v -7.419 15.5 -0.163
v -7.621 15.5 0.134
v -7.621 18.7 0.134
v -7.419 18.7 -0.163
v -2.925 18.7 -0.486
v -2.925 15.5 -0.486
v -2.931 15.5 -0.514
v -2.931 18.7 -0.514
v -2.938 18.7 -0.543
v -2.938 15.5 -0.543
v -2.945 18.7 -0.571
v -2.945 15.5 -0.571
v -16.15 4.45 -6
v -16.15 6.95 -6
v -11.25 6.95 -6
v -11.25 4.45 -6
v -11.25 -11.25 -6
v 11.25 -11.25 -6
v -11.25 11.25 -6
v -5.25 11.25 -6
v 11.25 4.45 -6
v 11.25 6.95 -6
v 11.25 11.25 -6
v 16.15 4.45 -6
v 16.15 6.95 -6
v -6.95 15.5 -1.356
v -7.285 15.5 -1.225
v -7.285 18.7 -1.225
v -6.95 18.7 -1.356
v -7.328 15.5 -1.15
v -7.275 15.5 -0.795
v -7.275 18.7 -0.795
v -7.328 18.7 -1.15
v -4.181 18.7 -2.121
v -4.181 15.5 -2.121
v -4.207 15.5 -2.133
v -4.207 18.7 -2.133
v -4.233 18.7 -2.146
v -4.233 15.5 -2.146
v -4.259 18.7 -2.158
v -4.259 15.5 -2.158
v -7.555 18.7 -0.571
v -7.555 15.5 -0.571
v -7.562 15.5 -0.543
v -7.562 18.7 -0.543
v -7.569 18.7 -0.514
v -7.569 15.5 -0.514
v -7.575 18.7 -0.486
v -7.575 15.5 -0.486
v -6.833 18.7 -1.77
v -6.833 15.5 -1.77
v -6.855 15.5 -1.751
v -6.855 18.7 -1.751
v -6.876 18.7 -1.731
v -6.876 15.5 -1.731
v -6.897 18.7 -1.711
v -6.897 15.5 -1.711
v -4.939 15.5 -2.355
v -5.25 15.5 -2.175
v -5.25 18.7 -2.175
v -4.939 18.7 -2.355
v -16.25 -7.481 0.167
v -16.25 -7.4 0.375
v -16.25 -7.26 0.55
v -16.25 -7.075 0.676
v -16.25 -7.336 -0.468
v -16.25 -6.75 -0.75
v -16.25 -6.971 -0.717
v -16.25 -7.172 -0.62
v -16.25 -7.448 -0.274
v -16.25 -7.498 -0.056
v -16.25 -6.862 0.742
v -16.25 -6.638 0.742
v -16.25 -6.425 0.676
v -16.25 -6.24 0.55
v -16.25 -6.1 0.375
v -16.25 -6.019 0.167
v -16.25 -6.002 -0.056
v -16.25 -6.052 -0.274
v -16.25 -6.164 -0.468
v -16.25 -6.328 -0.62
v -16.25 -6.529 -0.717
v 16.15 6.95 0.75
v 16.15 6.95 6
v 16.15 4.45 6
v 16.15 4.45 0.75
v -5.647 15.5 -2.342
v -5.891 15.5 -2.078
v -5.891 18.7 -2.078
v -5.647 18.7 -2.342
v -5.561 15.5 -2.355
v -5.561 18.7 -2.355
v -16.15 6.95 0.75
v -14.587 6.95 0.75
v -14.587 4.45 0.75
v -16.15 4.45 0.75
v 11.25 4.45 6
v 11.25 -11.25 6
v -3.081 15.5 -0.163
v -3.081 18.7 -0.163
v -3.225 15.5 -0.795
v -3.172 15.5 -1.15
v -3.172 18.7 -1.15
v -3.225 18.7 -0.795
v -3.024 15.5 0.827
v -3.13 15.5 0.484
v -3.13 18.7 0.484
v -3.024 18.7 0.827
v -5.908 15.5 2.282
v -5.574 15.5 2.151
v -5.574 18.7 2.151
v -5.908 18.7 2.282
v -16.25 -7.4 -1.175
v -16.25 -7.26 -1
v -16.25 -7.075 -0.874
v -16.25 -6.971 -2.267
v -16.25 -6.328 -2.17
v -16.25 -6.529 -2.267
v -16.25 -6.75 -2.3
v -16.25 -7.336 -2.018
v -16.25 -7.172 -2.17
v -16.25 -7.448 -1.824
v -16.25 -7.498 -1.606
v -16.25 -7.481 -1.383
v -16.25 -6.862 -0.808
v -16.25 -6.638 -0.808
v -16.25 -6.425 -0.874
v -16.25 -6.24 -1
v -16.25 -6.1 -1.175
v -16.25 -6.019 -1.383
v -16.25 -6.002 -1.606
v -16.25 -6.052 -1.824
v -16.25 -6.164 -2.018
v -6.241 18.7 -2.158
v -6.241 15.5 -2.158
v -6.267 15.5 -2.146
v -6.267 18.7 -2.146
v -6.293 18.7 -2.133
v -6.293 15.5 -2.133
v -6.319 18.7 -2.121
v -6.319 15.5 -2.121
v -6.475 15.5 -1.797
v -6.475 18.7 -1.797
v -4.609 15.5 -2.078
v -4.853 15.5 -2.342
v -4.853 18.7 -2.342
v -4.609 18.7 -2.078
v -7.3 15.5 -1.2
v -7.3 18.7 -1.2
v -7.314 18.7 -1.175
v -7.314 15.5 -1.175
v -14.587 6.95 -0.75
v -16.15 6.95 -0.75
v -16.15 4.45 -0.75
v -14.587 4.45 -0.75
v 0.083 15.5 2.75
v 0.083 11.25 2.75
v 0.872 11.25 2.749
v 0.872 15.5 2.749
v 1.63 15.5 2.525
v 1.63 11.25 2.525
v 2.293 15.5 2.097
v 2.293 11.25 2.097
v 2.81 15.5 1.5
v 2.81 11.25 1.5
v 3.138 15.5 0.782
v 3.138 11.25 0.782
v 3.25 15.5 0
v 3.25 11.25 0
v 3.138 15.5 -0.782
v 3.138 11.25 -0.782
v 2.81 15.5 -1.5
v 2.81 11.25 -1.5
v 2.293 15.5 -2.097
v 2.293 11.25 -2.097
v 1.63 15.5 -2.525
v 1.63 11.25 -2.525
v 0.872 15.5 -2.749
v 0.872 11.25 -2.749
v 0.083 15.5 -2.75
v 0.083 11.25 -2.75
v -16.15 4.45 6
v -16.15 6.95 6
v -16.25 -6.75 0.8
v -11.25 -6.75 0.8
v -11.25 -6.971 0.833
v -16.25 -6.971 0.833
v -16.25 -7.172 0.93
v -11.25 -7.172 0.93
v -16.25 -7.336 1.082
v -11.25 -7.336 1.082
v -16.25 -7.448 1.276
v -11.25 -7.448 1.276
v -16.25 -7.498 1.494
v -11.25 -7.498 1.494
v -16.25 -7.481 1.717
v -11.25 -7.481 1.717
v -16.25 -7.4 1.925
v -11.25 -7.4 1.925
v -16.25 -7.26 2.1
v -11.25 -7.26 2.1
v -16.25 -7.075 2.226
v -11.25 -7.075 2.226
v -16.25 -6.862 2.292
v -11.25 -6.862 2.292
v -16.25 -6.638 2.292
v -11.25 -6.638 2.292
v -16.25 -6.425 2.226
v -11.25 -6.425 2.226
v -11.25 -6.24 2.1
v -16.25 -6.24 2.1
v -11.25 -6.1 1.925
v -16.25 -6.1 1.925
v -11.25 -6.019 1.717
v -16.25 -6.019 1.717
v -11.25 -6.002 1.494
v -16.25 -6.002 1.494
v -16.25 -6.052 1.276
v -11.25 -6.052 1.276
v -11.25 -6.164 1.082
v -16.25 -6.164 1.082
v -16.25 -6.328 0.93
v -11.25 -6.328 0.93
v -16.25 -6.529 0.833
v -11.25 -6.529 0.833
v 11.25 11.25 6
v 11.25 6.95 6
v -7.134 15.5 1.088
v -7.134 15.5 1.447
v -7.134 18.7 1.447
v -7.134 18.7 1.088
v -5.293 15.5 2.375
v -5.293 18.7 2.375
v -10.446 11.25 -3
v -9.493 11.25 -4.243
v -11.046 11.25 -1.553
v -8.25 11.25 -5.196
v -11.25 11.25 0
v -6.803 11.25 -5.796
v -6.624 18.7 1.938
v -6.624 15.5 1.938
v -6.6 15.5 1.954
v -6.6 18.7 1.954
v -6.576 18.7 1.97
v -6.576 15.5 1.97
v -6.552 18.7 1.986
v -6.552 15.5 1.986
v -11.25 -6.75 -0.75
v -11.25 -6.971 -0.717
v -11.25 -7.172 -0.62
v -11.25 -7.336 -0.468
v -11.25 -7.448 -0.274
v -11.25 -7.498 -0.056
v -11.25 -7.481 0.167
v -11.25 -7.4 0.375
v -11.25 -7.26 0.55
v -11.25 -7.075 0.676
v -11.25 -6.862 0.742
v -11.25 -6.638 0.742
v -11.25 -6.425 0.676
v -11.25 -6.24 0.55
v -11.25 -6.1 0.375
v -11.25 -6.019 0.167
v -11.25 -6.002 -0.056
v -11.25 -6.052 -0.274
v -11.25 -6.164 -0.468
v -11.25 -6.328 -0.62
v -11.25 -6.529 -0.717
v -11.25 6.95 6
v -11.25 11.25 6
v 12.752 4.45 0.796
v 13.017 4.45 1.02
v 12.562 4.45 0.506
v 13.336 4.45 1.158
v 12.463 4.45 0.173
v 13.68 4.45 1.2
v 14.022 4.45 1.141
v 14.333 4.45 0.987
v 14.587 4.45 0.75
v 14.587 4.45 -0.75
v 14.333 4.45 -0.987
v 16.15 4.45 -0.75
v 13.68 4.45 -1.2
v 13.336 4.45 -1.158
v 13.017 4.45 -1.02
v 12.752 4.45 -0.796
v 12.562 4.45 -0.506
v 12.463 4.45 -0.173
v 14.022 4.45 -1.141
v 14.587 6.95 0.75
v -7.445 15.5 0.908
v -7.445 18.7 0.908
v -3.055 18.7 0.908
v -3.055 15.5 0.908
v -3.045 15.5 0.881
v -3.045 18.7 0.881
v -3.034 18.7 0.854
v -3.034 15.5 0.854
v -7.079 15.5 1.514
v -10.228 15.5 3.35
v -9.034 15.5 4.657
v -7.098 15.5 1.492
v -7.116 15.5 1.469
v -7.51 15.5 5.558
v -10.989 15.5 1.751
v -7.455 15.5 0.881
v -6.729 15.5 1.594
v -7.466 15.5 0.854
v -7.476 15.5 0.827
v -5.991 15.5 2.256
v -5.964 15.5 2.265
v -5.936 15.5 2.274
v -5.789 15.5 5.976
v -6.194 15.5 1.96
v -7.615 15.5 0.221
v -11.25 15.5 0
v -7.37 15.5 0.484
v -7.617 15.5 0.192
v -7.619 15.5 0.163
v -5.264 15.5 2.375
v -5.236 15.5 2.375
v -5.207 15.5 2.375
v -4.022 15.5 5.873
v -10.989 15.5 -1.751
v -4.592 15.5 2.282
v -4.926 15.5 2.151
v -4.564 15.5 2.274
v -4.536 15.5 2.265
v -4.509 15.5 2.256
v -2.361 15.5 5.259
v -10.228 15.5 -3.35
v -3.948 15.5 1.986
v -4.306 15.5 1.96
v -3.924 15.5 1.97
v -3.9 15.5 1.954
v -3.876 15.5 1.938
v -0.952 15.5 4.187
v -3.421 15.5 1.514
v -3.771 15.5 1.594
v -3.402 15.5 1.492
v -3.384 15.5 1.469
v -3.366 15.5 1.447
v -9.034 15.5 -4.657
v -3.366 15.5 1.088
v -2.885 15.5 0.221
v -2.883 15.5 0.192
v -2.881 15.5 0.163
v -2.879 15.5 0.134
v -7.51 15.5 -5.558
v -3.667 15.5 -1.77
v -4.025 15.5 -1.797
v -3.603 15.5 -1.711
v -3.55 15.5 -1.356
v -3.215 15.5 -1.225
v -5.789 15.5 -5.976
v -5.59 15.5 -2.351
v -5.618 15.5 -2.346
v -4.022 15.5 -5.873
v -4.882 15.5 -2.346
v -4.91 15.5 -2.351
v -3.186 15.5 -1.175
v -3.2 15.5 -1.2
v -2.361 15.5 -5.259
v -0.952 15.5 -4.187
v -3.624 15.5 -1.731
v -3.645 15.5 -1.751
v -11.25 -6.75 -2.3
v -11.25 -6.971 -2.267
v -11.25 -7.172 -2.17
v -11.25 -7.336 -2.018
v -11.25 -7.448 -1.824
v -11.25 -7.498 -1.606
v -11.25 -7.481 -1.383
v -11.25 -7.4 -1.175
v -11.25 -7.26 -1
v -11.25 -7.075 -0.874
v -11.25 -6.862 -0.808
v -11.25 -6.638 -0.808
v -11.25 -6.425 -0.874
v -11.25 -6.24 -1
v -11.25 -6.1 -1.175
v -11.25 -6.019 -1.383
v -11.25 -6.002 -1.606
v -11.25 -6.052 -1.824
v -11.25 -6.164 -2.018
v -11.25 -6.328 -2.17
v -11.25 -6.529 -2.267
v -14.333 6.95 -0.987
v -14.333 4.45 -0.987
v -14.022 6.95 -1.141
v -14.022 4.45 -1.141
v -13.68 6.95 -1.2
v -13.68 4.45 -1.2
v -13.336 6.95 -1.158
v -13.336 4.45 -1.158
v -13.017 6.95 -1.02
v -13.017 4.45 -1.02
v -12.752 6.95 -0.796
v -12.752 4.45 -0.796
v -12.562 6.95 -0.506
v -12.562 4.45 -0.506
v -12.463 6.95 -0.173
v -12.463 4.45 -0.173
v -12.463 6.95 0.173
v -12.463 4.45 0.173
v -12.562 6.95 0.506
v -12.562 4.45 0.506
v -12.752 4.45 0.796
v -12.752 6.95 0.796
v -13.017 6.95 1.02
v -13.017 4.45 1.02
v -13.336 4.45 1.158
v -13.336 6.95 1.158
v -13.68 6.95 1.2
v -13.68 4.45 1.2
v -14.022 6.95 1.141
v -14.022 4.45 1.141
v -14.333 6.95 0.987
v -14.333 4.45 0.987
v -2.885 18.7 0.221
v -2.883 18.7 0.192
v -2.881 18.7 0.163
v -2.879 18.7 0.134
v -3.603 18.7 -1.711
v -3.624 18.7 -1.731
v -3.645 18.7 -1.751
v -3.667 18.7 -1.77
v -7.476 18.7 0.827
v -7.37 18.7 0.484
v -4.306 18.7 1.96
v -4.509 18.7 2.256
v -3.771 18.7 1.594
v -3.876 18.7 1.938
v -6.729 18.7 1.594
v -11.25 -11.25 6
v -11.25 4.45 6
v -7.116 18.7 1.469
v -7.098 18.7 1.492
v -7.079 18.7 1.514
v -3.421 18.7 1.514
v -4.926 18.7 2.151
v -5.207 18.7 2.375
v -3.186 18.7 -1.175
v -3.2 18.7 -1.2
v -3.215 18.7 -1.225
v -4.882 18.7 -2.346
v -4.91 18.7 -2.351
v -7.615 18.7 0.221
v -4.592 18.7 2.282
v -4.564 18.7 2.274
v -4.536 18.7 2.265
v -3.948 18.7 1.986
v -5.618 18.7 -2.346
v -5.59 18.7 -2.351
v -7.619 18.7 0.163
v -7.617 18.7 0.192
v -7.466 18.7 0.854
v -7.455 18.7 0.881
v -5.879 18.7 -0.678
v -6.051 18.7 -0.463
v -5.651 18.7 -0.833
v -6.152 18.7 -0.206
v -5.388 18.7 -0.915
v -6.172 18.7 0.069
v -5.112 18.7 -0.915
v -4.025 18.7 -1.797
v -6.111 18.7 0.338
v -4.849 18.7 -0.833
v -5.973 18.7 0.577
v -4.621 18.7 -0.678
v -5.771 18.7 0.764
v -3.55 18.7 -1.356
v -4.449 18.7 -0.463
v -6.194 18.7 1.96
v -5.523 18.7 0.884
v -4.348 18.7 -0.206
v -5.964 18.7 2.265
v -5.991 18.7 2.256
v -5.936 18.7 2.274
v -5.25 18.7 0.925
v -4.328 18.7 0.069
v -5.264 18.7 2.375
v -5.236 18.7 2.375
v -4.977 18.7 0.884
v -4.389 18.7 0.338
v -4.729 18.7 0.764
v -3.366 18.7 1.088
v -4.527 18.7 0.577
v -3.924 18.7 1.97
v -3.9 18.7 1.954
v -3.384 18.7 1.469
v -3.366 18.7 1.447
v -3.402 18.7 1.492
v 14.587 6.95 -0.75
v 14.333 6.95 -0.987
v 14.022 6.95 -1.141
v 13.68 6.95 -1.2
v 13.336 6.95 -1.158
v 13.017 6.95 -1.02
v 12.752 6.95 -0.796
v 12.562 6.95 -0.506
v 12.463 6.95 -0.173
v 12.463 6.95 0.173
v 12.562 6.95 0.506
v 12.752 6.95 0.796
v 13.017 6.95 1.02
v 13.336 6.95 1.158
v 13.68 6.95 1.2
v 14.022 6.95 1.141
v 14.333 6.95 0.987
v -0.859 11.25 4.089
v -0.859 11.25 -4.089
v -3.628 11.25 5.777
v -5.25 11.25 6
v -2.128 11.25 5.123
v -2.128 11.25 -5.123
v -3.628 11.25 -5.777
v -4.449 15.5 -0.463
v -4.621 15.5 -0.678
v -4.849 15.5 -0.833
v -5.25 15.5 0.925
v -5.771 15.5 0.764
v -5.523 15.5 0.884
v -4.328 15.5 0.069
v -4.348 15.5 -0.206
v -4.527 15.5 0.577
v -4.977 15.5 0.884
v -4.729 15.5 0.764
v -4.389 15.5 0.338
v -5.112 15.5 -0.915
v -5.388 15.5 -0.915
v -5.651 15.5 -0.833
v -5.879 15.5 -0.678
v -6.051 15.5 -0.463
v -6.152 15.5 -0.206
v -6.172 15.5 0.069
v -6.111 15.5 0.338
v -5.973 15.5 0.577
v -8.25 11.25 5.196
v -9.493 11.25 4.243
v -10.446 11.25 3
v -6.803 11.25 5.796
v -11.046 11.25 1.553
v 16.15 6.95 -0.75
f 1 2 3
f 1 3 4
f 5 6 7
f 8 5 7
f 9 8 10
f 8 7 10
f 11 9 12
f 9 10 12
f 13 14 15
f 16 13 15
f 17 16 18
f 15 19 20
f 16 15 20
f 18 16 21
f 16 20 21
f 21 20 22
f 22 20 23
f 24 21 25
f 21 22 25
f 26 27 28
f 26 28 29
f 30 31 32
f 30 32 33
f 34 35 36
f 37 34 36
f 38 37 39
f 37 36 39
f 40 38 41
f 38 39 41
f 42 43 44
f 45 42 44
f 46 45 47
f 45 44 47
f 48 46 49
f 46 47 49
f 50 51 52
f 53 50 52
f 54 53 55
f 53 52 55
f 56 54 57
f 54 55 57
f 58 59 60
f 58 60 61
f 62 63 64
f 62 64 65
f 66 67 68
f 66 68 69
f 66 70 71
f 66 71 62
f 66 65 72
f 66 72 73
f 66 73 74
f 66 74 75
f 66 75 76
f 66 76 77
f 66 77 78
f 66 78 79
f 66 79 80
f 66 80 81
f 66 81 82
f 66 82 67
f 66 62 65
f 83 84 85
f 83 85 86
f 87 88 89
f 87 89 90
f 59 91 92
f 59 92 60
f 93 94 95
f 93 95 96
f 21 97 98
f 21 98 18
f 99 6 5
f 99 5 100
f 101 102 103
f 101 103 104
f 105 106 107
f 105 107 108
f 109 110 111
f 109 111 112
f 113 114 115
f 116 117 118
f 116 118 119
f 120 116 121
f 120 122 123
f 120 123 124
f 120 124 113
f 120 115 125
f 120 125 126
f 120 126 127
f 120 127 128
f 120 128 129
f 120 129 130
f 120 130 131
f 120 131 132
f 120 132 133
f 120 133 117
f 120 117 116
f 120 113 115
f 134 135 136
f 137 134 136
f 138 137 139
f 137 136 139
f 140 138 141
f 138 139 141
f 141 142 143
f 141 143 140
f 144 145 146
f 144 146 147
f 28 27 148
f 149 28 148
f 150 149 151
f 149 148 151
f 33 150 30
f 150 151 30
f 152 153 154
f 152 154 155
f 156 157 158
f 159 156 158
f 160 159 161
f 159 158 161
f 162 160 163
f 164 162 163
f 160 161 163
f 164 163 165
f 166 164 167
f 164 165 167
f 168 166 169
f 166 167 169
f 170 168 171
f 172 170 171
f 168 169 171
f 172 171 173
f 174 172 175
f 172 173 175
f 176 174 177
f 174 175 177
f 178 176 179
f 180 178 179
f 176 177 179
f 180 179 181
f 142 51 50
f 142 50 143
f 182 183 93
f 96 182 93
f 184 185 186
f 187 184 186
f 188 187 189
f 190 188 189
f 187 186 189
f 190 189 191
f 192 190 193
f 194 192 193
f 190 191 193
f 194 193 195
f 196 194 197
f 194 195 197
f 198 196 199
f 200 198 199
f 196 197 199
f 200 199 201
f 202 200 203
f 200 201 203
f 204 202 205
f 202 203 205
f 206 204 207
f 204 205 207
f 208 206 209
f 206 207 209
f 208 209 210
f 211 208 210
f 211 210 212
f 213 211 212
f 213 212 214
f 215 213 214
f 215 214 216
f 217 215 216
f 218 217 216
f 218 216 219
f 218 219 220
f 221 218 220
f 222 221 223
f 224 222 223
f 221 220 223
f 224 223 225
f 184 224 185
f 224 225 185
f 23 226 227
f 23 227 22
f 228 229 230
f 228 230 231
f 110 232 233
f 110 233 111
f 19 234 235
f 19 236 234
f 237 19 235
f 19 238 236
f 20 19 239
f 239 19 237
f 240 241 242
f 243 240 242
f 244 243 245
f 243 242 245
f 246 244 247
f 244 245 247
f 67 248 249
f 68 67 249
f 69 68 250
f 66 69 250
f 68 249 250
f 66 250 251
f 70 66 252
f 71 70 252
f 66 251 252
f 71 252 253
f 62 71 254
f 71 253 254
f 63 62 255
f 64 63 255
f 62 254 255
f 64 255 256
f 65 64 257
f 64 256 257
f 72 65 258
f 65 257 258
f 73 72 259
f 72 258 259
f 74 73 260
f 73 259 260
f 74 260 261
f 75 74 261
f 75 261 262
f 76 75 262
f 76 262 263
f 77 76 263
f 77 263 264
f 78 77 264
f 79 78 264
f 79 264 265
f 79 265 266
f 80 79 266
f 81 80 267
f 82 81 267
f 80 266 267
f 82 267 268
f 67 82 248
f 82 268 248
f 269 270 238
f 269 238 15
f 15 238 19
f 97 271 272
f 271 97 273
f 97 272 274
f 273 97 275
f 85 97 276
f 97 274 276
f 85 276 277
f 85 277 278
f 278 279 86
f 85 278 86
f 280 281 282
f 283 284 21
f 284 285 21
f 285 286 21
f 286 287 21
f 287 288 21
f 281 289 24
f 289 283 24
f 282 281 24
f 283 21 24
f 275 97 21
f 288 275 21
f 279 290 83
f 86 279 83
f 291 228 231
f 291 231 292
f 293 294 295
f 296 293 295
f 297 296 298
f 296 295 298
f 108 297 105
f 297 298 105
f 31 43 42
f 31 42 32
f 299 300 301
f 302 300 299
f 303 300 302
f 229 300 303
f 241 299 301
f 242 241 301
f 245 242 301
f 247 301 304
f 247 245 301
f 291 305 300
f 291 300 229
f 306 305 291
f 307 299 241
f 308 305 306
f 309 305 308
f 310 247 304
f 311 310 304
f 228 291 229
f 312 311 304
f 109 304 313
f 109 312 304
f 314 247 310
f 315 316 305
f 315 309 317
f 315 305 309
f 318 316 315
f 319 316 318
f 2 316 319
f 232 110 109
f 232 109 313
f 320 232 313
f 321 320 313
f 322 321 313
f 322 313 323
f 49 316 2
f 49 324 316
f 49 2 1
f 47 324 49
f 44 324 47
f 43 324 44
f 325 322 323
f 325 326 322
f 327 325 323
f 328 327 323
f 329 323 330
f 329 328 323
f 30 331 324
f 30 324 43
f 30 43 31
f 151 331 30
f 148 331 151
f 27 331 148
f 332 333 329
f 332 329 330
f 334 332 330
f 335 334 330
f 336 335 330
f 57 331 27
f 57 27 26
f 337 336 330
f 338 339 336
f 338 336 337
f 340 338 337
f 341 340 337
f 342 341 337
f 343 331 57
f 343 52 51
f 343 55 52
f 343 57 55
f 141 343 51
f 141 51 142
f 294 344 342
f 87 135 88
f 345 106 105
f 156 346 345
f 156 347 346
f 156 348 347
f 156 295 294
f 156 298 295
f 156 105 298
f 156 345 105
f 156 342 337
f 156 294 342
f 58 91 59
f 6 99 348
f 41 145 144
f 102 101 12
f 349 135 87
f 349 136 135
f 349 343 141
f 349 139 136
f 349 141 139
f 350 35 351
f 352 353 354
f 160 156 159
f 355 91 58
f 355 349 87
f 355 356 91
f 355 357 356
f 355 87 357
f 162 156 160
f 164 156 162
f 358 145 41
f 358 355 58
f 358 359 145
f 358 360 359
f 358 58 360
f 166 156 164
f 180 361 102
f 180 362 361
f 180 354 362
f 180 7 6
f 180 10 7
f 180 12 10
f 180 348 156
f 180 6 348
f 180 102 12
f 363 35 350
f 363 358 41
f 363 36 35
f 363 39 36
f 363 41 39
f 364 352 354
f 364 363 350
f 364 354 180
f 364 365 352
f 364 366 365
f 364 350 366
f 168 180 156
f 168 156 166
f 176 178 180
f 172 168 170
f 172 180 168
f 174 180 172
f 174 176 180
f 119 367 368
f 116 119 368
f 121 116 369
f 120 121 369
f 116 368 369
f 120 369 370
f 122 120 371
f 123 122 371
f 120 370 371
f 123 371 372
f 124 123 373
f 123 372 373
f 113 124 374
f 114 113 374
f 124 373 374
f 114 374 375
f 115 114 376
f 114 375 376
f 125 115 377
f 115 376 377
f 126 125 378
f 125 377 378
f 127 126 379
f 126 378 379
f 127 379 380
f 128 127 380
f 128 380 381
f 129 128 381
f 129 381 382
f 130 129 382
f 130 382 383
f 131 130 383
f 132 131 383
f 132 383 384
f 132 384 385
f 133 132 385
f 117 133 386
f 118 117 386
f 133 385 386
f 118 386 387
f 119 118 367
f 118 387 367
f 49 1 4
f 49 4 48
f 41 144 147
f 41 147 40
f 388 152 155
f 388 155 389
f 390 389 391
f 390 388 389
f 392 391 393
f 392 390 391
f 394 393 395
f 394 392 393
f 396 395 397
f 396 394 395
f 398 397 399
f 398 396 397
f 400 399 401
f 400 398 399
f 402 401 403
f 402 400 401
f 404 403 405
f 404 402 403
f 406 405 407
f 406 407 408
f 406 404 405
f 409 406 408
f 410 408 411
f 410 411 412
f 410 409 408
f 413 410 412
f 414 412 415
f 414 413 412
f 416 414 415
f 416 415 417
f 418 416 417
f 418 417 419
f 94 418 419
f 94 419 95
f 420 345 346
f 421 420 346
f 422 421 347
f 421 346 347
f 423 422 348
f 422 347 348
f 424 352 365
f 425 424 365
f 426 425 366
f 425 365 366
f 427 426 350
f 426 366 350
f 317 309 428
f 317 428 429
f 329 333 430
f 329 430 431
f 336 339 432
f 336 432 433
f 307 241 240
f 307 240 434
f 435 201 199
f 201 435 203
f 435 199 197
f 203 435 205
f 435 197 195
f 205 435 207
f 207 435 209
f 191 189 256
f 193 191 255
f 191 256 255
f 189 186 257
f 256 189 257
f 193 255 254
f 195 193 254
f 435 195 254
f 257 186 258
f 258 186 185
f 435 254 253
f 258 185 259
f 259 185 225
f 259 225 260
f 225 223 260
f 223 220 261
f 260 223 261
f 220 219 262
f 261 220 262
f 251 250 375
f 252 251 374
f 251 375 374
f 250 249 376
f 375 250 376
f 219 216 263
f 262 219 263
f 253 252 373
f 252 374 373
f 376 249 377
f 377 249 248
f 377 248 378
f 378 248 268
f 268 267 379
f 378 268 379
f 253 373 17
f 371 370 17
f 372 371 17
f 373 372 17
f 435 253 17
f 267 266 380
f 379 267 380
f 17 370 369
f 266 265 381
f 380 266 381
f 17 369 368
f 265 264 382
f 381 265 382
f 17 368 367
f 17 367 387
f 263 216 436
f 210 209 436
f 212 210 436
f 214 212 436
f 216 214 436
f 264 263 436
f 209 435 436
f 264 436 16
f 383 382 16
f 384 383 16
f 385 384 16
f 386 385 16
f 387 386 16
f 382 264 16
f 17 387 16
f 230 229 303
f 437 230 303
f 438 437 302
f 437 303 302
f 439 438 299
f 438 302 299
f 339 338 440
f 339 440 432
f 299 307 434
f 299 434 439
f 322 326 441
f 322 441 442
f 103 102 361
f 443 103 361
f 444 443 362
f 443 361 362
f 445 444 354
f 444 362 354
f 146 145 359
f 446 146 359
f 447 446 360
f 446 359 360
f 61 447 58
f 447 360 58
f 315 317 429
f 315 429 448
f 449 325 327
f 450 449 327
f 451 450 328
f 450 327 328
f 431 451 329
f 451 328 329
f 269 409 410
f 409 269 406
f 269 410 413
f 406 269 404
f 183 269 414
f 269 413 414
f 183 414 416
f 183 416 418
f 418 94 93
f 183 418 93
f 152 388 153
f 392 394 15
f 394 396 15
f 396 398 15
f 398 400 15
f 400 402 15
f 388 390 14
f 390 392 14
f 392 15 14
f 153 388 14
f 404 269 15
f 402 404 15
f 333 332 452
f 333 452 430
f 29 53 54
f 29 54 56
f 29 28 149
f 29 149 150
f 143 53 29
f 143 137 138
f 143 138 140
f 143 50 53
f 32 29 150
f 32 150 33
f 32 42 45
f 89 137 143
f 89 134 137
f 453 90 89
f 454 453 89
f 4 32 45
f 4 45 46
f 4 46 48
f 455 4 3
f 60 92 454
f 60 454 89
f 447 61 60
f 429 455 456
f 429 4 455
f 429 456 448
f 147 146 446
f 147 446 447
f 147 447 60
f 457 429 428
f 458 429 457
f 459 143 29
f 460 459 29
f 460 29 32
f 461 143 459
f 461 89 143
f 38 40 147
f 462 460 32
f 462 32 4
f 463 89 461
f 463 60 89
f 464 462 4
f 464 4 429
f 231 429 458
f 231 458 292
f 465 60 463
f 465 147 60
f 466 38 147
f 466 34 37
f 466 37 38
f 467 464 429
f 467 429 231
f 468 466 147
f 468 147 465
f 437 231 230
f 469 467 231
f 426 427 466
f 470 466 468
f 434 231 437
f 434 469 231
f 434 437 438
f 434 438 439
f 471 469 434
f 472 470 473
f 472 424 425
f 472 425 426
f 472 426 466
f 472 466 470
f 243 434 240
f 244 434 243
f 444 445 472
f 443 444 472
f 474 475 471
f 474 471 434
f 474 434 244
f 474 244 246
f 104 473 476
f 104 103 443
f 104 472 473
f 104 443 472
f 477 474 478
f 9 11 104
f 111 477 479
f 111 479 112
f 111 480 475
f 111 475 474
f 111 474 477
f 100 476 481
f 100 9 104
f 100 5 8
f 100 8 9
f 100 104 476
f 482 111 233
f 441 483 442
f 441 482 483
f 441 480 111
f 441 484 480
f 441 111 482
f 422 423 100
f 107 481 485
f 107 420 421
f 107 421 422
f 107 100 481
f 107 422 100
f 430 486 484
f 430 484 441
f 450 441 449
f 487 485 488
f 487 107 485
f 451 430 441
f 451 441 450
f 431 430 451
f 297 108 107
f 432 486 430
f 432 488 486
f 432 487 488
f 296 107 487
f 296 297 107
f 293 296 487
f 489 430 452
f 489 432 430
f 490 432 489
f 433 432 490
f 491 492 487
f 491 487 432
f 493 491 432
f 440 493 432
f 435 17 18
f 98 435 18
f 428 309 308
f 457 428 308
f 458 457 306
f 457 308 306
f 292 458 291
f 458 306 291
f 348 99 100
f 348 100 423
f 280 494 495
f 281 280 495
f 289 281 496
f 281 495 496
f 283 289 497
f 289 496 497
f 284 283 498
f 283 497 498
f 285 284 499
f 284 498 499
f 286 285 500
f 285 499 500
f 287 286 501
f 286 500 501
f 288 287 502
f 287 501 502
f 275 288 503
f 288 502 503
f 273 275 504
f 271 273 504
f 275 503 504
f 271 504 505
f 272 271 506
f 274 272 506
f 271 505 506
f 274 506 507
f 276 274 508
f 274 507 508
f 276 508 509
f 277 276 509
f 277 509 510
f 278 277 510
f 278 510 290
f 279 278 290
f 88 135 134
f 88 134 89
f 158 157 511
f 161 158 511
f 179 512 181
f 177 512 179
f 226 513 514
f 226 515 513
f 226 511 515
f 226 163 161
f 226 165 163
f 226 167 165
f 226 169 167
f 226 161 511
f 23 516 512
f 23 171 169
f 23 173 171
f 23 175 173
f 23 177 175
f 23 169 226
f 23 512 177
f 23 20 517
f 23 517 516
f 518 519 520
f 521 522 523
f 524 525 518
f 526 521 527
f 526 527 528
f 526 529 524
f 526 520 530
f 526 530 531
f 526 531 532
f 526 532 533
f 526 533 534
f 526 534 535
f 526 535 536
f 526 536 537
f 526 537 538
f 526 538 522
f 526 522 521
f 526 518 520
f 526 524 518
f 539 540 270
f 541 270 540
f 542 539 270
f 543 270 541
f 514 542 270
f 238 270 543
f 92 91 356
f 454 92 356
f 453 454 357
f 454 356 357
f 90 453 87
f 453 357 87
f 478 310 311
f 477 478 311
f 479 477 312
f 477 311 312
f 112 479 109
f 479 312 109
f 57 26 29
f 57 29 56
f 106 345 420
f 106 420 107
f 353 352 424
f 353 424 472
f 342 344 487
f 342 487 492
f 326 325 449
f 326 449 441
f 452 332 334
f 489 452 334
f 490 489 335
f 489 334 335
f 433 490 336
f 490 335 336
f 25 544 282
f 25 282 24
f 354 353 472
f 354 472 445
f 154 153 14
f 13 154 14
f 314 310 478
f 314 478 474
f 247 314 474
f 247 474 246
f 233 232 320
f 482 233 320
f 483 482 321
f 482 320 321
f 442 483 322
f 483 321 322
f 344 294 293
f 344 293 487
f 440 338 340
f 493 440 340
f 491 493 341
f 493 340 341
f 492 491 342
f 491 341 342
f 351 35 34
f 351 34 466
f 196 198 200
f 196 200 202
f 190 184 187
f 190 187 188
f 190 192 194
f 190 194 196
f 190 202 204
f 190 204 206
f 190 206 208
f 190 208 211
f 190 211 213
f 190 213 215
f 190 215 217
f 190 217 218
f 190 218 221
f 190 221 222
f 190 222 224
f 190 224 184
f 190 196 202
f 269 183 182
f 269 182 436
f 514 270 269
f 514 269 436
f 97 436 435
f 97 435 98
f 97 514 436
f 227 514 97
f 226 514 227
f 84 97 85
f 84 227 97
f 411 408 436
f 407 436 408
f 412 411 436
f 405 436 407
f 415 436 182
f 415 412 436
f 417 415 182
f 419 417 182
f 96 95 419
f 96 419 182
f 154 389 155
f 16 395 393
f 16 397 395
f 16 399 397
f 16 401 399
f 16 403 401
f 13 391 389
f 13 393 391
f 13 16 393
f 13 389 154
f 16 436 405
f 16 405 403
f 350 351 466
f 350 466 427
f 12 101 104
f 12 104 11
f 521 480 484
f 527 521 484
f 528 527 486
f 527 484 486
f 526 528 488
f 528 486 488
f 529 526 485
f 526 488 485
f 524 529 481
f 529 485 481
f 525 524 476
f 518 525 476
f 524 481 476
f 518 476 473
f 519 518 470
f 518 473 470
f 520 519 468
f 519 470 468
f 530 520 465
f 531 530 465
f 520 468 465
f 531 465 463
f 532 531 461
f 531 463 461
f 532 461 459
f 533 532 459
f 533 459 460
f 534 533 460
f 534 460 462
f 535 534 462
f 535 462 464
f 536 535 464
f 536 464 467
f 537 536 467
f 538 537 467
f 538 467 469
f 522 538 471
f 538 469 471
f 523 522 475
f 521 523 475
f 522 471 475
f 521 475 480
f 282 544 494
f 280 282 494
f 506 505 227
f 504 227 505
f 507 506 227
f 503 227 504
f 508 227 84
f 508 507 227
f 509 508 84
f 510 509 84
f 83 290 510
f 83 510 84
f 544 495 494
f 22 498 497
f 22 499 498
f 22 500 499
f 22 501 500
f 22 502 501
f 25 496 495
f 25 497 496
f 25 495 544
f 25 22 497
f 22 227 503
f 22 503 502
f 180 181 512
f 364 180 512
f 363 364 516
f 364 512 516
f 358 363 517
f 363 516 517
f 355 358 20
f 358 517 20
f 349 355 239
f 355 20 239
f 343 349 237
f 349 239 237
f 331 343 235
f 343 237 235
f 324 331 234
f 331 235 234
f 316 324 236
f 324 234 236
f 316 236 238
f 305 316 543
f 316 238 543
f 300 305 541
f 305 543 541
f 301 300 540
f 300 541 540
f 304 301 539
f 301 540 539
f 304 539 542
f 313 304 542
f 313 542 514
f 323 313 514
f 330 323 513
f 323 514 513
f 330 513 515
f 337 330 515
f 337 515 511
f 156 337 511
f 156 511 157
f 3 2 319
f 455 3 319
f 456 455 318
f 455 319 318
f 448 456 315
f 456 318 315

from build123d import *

# Parameters (mm, degrees)
SKETCH1_W           = 22.5
SKETCH1_H           = 12
BOSS_EXTRUDE1_DEPTH = 11.25
SKETCH3_R           = 6
SKETCH3_R_2         = 2.777492364
BOSS_EXTRUDE3_DEPTH = 4.25
SKETCH4_W           = 4.9
SKETCH4_H           = 12
BOSS_EXTRUDE4_DEPTH = 2.5
SKETCH5_R           = 1.2
CUT_EXTRUDE1_DEPTH  = 2.5
SKETCH6_R           = 0.75
BOSS_EXTRUDE5_DEPTH = 5
SKETCH7_R           = 2.375
BOSS_EXTRUDE6_DEPTH = 3.2
CUT_EXTRUDE2_START  = -3.2
CUT_EXTRUDE2_DEPTH  = 3.2
SKETCH9_R           = 0.925
CUT_EXTRUDE3_DEPTH  = 3.2


with BuildPart() as part:
    # Sketch1 → Boss-Extrude1 (new, symmetric)
    with BuildSketch(Plane(origin=(0, 0, 0), x_dir=(1, 0, 0), z_dir=(0, 1, 0))):
        Rectangle(SKETCH1_W, SKETCH1_H)
    extrude(amount=BOSS_EXTRUDE1_DEPTH, both=True)

    # Sketch3 → Boss-Extrude3 (add)
    with BuildSketch(Plane(origin=(0, 11.25, 0), x_dir=(1, 0, 0), z_dir=(0, 1, 0))):
        with Locations((-5.25, 0)):
            Circle(SKETCH3_R)
        with Locations((0.472507636, 0)):
            Circle(SKETCH3_R_2)
    extrude(amount=BOSS_EXTRUDE3_DEPTH)

    # Sketch4 → Boss-Extrude4 (add)
    with BuildSketch(Plane(origin=(0, 6.95, 0), x_dir=(1, 0, 0), z_dir=(0, 1, 0))):
        with Locations((13.7, 0)):
            Rectangle(SKETCH4_W, SKETCH4_H)
    boss_extrude4 = extrude(amount=-BOSS_EXTRUDE4_DEPTH)

    # Sketch5 → Cut-Extrude1 (cut)
    with BuildSketch(Plane(origin=(0, 6.95, 0), x_dir=(1, 0, 0), z_dir=(0, 1, 0))):
        with BuildLine():
            Line((16.15, -0.75), (16.15, 0.75))
            Line((16.15, 0.75), (14.5867497, 0.75))
            ThreePointArc((14.5867497, 0.75), (14.782276388, 0.397429466), (14.85, 0))
            ThreePointArc((14.85, 0), (14.782276388, -0.397429466), (14.5867497, -0.75))
            Line((14.5867497, -0.75), (16.15, -0.75))
        make_face()
        with Locations((13.65, 0)):
            Circle(SKETCH5_R)
    cut_extrude1 = extrude(amount=-CUT_EXTRUDE1_DEPTH, mode=Mode.SUBTRACT)

    # Mirror1: Boss-Extrude4, Cut-Extrude1 across plane
    add(boss_extrude4.mirror(Plane(origin=(0, 0, 0), x_dir=(0, 0, 1), z_dir=(1, 0, 0))))
    add(cut_extrude1.mirror(Plane(origin=(0, 0, 0), x_dir=(0, 0, 1), z_dir=(1, 0, 0))), mode=Mode.SUBTRACT)

    # Sketch6 → Boss-Extrude5 (add)
    with BuildSketch(Plane.ZY.offset(11.25)):
        with Locations(Location((0, -6.75, 0), (0, 0, 180))):
            Circle(SKETCH6_R)
        with Locations(Location((1.55, -6.75, 0), (0, 0, 180))):
            Circle(SKETCH6_R)
        with Locations(Location((-1.55, -6.75, 0), (0, 0, 180))):
            Circle(SKETCH6_R)
    extrude(amount=BOSS_EXTRUDE5_DEPTH)

    # Sketch7 → Boss-Extrude6 (add)
    with BuildSketch(Plane(origin=(0, 15.5, 0), x_dir=(1, 0, 0), z_dir=(0, 1, 0))):
        with Locations(Location((-5.25, 0, 0), (0, 0, 270))):
            Circle(SKETCH7_R)
    extrude(amount=BOSS_EXTRUDE6_DEPTH)

    # Sketch8 → Cut-Extrude2 (cut)
    with BuildSketch(Plane(origin=(0, 18.7, 0), x_dir=(1, 0, 0), z_dir=(0, 1, 0)).offset(CUT_EXTRUDE2_START)):
        with BuildLine():
            ThreePointArc((-4.939008874, 2.354550811), (-5.25, 2.375), (-5.560991126, 2.354550811))
            Line((-5.560991126, 2.354550811), (-5.25, 2.175))
            Line((-5.25, 2.175), (-4.939008874, 2.354550811))
        make_face()
        with BuildLine():
            ThreePointArc((-4.258809302, 2.158278481), (-4.549956461, 2.269485414), (-4.853158628, 2.341610968))
            Line((-4.853158628, 2.341610968), (-4.608907496, 2.078370853))
            Line((-4.608907496, 2.078370853), (-4.258809302, 2.158278481))
        make_face()
        with BuildLine():
            ThreePointArc((-3.666681374, 1.770233636), (-3.912114862, 1.962317089), (-4.180587228, 2.120608715))
            Line((-4.180587228, 2.120608715), (-4.024778874, 1.797069334))
            Line((-4.024778874, 1.797069334), (-3.666681374, 1.770233636))
        make_face()
        with BuildLine():
            ThreePointArc((-3.215238254, 1.224895765), (-3.393150229, 1.480788279), (-3.603037845, 1.711181072))
            Line((-3.603037845, 1.711181072), (-3.549516526, 1.356090319))
            Line((-3.549516526, 1.356090319), (-3.215238254, 1.224895765))
        make_face()
        with BuildLine():
            ThreePointArc((-2.944592644, 0.570720529), (-3.039174847, 0.867684933), (-3.171828277, 1.149707481))
            Line((-3.171828277, 1.149707481), (-3.225349597, 0.794616728))
            Line((-3.225349597, 0.794616728), (-2.944592644, 0.570720529))
        make_face()
        with BuildLine():
            ThreePointArc((-2.878792595, -0.13416573), (-2.881640982, 0.177483972), (-2.925273387, 0.486077335))
            Line((-2.925273387, 0.486077335), (-3.081081741, 0.162537954))
            Line((-3.081081741, 0.162537954), (-2.878792595, -0.13416573))
        make_face()
        with BuildLine():
            ThreePointArc((-3.02368473, -0.827130775), (-2.934546209, -0.528487218), (-2.885280658, -0.220742916))
            Line((-2.885280658, -0.220742916), (-3.129531791, -0.483983031))
            Line((-3.129531791, -0.483983031), (-3.02368473, -0.827130775))
        make_face()
        with BuildLine():
            ThreePointArc((-3.366394747, -1.446601621), (-3.193189666, -1.1875), (-3.05540362, -0.907949189))
            Line((-3.05540362, -0.907949189), (-3.366394747, -1.0875))
            Line((-3.366394747, -1.0875), (-3.366394747, -1.446601621))
        make_face()
        with BuildLine():
            ThreePointArc((-3.876471356, -1.937535565), (-3.634589748, -1.740998196), (-3.420526102, -1.514480193))
            Line((-3.420526102, -1.514480193), (-3.770624295, -1.594387821))
            Line((-3.770624295, -1.594387821), (-3.876471356, -1.937535565))
        make_face()
        with BuildLine():
            ThreePointArc((-4.508592013, -2.256310971), (-4.21952612, -2.139801061), (-3.948205367, -1.986442985))
            Line((-3.948205367, -1.986442985), (-4.306302867, -1.959607288))
            Line((-4.306302867, -1.959607288), (-4.508592013, -2.256310971))
        make_face()
        with BuildLine():
            ThreePointArc((-5.206590024, -2.374603246), (-4.896024618, -2.348473212), (-4.591554799, -2.281901601))
            Line((-4.591554799, -2.281901601), (-4.925833071, -2.150707047))
            Line((-4.925833071, -2.150707047), (-5.206590024, -2.374603246))
        make_face()
        with BuildLine():
            ThreePointArc((-5.908445201, -2.281901601), (-5.603975382, -2.348473212), (-5.293409976, -2.374603246))
            Line((-5.293409976, -2.374603246), (-5.574166929, -2.150707047))
            Line((-5.574166929, -2.150707047), (-5.908445201, -2.281901601))
        make_face()
        with BuildLine():
            ThreePointArc((-6.551794633, -1.986442985), (-6.28047388, -2.139801061), (-5.991407987, -2.256310971))
            Line((-5.991407987, -2.256310971), (-6.193697133, -1.959607288))
            Line((-6.193697133, -1.959607288), (-6.551794633, -1.986442985))
        make_face()
        with BuildLine():
            ThreePointArc((-7.079473898, -1.514480193), (-6.865410252, -1.740998196), (-6.623528644, -1.937535565))
            Line((-6.623528644, -1.937535565), (-6.729375705, -1.594387821))
            Line((-6.729375705, -1.594387821), (-7.079473898, -1.514480193))
        make_face()
        with BuildLine():
            ThreePointArc((-7.44459638, -0.907949189), (-7.306810334, -1.1875), (-7.133605253, -1.446601621))
            Line((-7.133605253, -1.446601621), (-7.133605253, -1.0875))
            Line((-7.133605253, -1.0875), (-7.44459638, -0.907949189))
        make_face()
        with BuildLine():
            ThreePointArc((-7.614719342, -0.220742916), (-7.565453791, -0.528487218), (-7.47631527, -0.827130775))
            Line((-7.47631527, -0.827130775), (-7.370468209, -0.483983031))
            Line((-7.370468209, -0.483983031), (-7.614719342, -0.220742916))
        make_face()
        with BuildLine():
            ThreePointArc((-7.574726613, 0.486077335), (-7.618359018, 0.177483972), (-7.621207405, -0.13416573))
            Line((-7.621207405, -0.13416573), (-7.418918259, 0.162537954))
            Line((-7.418918259, 0.162537954), (-7.574726613, 0.486077335))
        make_face()
        with BuildLine():
            ThreePointArc((-7.328171723, 1.149707481), (-7.460825153, 0.867684933), (-7.555407356, 0.570720529))
            Line((-7.555407356, 0.570720529), (-7.274650403, 0.794616728))
            Line((-7.274650403, 0.794616728), (-7.328171723, 1.149707481))
        make_face()
        with BuildLine():
            ThreePointArc((-6.896962155, 1.711181072), (-7.106849771, 1.480788279), (-7.284761746, 1.224895765))
            Line((-7.284761746, 1.224895765), (-6.950483474, 1.356090319))
            Line((-6.950483474, 1.356090319), (-6.896962155, 1.711181072))
        make_face()
        with BuildLine():
            ThreePointArc((-6.319412772, 2.120608715), (-6.587885138, 1.962317089), (-6.833318626, 1.770233636))
            Line((-6.833318626, 1.770233636), (-6.475221126, 1.797069334))
            Line((-6.475221126, 1.797069334), (-6.319412772, 2.120608715))
        make_face()
        with BuildLine():
            ThreePointArc((-5.646841372, 2.341610968), (-5.950043539, 2.269485414), (-6.241190698, 2.158278481))
            Line((-6.241190698, 2.158278481), (-5.891092504, 2.078370853))
            Line((-5.891092504, 2.078370853), (-5.646841372, 2.341610968))
        make_face()
    extrude(amount=CUT_EXTRUDE2_DEPTH, mode=Mode.SUBTRACT)

    # Sketch9 → Cut-Extrude3 (cut)
    with BuildSketch(Plane(origin=(0, 18.7, 0), x_dir=(1, 0, 0), z_dir=(0, 1, 0))):
        with Locations(Location((-5.25, 0, 0), (0, 0, 270))):
            Circle(SKETCH9_R)
    extrude(amount=-CUT_EXTRUDE3_DEPTH, mode=Mode.SUBTRACT)


solid = part.part
